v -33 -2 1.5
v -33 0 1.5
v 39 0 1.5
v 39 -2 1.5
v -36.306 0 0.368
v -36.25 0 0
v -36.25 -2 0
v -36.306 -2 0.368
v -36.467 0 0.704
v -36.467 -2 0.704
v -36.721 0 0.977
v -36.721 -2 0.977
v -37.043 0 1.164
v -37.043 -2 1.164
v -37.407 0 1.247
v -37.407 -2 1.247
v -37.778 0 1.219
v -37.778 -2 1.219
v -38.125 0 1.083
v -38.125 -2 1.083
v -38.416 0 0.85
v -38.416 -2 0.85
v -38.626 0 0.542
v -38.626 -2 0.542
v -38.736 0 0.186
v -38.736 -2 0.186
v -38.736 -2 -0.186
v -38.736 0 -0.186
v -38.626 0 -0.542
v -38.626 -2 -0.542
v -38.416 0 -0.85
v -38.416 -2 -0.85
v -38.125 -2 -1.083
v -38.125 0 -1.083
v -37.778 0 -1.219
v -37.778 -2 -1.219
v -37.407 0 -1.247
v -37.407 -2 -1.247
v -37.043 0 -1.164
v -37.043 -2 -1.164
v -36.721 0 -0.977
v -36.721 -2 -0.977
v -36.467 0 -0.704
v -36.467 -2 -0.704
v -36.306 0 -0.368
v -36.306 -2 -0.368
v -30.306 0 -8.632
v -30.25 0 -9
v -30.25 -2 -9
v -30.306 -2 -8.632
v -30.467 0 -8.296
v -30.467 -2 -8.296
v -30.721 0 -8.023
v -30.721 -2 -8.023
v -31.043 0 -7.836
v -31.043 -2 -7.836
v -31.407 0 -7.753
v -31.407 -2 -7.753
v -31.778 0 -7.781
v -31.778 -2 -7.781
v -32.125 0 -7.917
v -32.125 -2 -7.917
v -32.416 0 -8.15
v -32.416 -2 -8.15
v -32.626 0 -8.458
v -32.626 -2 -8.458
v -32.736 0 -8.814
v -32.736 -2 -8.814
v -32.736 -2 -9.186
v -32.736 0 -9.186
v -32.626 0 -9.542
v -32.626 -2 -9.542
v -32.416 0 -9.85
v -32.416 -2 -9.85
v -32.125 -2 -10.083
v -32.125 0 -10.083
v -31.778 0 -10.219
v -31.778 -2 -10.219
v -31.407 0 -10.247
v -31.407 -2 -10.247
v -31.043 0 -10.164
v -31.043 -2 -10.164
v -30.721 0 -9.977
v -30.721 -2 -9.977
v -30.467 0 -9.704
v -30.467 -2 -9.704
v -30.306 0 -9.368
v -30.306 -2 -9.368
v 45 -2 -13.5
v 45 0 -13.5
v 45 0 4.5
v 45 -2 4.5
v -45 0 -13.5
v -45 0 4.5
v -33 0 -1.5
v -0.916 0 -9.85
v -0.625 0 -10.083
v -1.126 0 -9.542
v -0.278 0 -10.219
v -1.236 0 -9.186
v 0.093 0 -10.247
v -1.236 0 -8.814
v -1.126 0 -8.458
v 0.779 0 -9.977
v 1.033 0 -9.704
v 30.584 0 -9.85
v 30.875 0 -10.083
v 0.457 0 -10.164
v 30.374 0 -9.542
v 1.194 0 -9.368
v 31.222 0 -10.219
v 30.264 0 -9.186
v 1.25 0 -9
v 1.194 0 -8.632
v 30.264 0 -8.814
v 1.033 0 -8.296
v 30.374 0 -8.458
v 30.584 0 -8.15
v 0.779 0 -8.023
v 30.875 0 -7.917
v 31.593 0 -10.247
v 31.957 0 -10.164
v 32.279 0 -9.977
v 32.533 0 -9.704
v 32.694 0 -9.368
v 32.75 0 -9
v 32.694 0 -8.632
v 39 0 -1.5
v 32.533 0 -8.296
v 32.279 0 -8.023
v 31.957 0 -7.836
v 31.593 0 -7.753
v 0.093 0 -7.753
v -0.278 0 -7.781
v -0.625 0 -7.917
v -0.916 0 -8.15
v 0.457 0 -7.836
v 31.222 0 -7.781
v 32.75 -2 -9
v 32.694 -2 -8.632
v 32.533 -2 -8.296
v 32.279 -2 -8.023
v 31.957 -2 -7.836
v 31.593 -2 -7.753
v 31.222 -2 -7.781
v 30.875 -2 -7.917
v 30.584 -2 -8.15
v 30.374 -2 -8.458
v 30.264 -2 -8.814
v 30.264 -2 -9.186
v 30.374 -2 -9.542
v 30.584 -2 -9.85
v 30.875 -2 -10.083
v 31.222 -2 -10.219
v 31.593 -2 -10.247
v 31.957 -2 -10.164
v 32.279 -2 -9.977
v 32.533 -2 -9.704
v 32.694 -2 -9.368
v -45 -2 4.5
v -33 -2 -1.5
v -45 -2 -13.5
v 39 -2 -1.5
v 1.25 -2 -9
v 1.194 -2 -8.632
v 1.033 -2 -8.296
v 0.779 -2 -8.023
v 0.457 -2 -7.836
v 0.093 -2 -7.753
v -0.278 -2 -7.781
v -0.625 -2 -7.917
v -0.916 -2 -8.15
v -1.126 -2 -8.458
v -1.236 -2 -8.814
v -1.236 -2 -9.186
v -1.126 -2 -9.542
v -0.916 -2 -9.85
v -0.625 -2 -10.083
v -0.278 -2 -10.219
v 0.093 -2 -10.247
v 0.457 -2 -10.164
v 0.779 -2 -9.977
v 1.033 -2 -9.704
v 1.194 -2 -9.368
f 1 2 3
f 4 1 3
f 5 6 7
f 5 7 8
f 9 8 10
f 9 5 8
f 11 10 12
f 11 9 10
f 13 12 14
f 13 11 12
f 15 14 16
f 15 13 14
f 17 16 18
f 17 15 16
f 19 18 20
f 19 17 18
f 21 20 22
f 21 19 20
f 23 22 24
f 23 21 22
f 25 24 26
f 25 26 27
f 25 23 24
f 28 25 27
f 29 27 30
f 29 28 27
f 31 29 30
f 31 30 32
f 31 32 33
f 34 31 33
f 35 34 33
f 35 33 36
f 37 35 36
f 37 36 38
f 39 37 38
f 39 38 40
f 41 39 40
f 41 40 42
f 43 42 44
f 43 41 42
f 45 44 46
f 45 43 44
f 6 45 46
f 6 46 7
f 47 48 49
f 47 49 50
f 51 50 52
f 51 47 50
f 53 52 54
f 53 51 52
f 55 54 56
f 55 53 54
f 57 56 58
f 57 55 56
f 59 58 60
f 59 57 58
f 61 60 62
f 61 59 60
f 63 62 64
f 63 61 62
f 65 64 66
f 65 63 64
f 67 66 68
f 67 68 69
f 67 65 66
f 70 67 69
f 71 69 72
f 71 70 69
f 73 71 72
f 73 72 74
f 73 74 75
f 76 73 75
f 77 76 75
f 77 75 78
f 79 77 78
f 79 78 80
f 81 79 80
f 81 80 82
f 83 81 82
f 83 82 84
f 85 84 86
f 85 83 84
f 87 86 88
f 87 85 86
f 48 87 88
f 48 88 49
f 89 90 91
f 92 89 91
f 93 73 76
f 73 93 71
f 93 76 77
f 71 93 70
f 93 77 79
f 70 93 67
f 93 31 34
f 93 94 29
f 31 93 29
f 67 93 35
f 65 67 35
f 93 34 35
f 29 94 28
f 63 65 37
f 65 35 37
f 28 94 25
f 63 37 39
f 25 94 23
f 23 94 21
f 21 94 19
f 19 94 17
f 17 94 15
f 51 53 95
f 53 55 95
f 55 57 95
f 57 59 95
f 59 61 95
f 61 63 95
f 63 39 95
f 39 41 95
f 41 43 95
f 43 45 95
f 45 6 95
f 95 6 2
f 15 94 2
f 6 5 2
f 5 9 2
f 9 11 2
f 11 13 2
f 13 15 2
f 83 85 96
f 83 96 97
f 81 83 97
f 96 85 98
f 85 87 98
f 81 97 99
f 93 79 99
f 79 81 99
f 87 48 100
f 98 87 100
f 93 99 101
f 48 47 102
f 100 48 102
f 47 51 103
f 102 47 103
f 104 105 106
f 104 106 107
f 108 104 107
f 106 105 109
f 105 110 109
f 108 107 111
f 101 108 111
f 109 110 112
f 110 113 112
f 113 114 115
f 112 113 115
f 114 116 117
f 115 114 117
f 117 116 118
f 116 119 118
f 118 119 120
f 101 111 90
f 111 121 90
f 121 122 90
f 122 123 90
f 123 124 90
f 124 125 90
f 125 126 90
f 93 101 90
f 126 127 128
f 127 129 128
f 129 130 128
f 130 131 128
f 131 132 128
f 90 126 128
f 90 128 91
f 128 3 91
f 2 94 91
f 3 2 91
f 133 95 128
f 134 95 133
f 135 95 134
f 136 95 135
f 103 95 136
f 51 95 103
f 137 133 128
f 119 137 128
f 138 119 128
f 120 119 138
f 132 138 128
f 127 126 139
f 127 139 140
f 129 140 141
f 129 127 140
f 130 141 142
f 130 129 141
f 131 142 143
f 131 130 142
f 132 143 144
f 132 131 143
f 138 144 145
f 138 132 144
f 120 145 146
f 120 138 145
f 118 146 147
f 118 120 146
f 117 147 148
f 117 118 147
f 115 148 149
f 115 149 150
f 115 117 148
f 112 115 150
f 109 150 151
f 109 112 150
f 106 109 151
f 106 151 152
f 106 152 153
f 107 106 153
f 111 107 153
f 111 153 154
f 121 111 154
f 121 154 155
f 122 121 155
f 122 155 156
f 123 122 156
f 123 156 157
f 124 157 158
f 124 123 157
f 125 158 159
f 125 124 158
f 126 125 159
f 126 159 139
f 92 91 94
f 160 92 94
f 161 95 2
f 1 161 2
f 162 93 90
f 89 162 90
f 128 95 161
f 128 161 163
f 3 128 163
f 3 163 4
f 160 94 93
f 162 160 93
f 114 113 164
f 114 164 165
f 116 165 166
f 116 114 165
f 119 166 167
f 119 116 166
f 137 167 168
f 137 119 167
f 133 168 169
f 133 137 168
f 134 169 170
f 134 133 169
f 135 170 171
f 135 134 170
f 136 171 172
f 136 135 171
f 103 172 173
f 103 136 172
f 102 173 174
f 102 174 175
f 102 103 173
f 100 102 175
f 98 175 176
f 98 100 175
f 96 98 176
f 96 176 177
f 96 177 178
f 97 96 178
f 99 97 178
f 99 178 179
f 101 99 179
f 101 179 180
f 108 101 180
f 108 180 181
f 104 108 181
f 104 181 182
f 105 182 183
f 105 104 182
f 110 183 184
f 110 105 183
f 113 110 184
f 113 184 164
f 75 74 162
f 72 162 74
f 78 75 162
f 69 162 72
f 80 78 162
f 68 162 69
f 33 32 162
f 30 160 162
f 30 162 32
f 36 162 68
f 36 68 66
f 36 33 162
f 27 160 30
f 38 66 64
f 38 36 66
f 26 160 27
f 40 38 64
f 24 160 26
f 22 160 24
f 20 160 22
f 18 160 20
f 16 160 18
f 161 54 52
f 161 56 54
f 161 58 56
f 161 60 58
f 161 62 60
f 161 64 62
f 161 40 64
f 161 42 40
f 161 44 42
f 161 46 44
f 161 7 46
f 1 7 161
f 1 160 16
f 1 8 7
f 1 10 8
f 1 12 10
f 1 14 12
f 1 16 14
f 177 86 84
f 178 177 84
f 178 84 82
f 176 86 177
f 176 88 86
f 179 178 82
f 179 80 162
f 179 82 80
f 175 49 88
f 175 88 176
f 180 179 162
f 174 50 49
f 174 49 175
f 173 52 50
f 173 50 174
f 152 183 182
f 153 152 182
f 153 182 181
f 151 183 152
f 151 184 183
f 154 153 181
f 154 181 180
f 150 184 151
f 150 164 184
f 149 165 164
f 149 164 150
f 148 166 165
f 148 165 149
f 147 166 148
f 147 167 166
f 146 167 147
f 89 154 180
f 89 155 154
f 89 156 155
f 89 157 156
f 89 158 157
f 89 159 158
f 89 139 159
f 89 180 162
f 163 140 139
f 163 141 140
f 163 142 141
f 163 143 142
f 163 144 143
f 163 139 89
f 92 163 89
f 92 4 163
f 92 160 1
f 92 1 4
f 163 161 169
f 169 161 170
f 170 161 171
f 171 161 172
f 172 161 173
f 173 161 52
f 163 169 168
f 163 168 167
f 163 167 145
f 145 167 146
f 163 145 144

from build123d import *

# Parameters (mm, degrees)
F0_W     = 84
F0_H     = 9
F0_R     = 1.25
F0_W_2   = 72
F0_H_2   = 3
F1_DEPTH = 2


with BuildPart() as f1:
    # F0 (on Front) → F1 (new body)
    with BuildSketch(Plane.XZ):
        Rectangle(F0_W, F0_H)
        with Locations((-37.5, 0)):
            Circle(F0_R, mode=Mode.SUBTRACT)
        with Locations((3, 0)):
            Rectangle(F0_W_2, F0_H_2, mode=Mode.SUBTRACT)
        Polygon((45, 4.5), (42, 4.5), (42, -4.5), (42, -13.5), (45, -13.5), align=None)
        Polygon((-42, -4.5), (-42, 4.5), (-45, 4.5), (-45, -13.5), (-42, -13.5), align=None)
        with Locations((0, -9)):
            Rectangle(F0_W, F0_H)
        with Locations((-31.5, -9)):
            Circle(F0_R, mode=Mode.SUBTRACT)
        with Locations((0, -9)):
            Circle(F0_R, mode=Mode.SUBTRACT)
        with Locations((31.5, -9)):
            Circle(F0_R, mode=Mode.SUBTRACT)
    extrude(amount=F1_DEPTH)


solid = f1.part
